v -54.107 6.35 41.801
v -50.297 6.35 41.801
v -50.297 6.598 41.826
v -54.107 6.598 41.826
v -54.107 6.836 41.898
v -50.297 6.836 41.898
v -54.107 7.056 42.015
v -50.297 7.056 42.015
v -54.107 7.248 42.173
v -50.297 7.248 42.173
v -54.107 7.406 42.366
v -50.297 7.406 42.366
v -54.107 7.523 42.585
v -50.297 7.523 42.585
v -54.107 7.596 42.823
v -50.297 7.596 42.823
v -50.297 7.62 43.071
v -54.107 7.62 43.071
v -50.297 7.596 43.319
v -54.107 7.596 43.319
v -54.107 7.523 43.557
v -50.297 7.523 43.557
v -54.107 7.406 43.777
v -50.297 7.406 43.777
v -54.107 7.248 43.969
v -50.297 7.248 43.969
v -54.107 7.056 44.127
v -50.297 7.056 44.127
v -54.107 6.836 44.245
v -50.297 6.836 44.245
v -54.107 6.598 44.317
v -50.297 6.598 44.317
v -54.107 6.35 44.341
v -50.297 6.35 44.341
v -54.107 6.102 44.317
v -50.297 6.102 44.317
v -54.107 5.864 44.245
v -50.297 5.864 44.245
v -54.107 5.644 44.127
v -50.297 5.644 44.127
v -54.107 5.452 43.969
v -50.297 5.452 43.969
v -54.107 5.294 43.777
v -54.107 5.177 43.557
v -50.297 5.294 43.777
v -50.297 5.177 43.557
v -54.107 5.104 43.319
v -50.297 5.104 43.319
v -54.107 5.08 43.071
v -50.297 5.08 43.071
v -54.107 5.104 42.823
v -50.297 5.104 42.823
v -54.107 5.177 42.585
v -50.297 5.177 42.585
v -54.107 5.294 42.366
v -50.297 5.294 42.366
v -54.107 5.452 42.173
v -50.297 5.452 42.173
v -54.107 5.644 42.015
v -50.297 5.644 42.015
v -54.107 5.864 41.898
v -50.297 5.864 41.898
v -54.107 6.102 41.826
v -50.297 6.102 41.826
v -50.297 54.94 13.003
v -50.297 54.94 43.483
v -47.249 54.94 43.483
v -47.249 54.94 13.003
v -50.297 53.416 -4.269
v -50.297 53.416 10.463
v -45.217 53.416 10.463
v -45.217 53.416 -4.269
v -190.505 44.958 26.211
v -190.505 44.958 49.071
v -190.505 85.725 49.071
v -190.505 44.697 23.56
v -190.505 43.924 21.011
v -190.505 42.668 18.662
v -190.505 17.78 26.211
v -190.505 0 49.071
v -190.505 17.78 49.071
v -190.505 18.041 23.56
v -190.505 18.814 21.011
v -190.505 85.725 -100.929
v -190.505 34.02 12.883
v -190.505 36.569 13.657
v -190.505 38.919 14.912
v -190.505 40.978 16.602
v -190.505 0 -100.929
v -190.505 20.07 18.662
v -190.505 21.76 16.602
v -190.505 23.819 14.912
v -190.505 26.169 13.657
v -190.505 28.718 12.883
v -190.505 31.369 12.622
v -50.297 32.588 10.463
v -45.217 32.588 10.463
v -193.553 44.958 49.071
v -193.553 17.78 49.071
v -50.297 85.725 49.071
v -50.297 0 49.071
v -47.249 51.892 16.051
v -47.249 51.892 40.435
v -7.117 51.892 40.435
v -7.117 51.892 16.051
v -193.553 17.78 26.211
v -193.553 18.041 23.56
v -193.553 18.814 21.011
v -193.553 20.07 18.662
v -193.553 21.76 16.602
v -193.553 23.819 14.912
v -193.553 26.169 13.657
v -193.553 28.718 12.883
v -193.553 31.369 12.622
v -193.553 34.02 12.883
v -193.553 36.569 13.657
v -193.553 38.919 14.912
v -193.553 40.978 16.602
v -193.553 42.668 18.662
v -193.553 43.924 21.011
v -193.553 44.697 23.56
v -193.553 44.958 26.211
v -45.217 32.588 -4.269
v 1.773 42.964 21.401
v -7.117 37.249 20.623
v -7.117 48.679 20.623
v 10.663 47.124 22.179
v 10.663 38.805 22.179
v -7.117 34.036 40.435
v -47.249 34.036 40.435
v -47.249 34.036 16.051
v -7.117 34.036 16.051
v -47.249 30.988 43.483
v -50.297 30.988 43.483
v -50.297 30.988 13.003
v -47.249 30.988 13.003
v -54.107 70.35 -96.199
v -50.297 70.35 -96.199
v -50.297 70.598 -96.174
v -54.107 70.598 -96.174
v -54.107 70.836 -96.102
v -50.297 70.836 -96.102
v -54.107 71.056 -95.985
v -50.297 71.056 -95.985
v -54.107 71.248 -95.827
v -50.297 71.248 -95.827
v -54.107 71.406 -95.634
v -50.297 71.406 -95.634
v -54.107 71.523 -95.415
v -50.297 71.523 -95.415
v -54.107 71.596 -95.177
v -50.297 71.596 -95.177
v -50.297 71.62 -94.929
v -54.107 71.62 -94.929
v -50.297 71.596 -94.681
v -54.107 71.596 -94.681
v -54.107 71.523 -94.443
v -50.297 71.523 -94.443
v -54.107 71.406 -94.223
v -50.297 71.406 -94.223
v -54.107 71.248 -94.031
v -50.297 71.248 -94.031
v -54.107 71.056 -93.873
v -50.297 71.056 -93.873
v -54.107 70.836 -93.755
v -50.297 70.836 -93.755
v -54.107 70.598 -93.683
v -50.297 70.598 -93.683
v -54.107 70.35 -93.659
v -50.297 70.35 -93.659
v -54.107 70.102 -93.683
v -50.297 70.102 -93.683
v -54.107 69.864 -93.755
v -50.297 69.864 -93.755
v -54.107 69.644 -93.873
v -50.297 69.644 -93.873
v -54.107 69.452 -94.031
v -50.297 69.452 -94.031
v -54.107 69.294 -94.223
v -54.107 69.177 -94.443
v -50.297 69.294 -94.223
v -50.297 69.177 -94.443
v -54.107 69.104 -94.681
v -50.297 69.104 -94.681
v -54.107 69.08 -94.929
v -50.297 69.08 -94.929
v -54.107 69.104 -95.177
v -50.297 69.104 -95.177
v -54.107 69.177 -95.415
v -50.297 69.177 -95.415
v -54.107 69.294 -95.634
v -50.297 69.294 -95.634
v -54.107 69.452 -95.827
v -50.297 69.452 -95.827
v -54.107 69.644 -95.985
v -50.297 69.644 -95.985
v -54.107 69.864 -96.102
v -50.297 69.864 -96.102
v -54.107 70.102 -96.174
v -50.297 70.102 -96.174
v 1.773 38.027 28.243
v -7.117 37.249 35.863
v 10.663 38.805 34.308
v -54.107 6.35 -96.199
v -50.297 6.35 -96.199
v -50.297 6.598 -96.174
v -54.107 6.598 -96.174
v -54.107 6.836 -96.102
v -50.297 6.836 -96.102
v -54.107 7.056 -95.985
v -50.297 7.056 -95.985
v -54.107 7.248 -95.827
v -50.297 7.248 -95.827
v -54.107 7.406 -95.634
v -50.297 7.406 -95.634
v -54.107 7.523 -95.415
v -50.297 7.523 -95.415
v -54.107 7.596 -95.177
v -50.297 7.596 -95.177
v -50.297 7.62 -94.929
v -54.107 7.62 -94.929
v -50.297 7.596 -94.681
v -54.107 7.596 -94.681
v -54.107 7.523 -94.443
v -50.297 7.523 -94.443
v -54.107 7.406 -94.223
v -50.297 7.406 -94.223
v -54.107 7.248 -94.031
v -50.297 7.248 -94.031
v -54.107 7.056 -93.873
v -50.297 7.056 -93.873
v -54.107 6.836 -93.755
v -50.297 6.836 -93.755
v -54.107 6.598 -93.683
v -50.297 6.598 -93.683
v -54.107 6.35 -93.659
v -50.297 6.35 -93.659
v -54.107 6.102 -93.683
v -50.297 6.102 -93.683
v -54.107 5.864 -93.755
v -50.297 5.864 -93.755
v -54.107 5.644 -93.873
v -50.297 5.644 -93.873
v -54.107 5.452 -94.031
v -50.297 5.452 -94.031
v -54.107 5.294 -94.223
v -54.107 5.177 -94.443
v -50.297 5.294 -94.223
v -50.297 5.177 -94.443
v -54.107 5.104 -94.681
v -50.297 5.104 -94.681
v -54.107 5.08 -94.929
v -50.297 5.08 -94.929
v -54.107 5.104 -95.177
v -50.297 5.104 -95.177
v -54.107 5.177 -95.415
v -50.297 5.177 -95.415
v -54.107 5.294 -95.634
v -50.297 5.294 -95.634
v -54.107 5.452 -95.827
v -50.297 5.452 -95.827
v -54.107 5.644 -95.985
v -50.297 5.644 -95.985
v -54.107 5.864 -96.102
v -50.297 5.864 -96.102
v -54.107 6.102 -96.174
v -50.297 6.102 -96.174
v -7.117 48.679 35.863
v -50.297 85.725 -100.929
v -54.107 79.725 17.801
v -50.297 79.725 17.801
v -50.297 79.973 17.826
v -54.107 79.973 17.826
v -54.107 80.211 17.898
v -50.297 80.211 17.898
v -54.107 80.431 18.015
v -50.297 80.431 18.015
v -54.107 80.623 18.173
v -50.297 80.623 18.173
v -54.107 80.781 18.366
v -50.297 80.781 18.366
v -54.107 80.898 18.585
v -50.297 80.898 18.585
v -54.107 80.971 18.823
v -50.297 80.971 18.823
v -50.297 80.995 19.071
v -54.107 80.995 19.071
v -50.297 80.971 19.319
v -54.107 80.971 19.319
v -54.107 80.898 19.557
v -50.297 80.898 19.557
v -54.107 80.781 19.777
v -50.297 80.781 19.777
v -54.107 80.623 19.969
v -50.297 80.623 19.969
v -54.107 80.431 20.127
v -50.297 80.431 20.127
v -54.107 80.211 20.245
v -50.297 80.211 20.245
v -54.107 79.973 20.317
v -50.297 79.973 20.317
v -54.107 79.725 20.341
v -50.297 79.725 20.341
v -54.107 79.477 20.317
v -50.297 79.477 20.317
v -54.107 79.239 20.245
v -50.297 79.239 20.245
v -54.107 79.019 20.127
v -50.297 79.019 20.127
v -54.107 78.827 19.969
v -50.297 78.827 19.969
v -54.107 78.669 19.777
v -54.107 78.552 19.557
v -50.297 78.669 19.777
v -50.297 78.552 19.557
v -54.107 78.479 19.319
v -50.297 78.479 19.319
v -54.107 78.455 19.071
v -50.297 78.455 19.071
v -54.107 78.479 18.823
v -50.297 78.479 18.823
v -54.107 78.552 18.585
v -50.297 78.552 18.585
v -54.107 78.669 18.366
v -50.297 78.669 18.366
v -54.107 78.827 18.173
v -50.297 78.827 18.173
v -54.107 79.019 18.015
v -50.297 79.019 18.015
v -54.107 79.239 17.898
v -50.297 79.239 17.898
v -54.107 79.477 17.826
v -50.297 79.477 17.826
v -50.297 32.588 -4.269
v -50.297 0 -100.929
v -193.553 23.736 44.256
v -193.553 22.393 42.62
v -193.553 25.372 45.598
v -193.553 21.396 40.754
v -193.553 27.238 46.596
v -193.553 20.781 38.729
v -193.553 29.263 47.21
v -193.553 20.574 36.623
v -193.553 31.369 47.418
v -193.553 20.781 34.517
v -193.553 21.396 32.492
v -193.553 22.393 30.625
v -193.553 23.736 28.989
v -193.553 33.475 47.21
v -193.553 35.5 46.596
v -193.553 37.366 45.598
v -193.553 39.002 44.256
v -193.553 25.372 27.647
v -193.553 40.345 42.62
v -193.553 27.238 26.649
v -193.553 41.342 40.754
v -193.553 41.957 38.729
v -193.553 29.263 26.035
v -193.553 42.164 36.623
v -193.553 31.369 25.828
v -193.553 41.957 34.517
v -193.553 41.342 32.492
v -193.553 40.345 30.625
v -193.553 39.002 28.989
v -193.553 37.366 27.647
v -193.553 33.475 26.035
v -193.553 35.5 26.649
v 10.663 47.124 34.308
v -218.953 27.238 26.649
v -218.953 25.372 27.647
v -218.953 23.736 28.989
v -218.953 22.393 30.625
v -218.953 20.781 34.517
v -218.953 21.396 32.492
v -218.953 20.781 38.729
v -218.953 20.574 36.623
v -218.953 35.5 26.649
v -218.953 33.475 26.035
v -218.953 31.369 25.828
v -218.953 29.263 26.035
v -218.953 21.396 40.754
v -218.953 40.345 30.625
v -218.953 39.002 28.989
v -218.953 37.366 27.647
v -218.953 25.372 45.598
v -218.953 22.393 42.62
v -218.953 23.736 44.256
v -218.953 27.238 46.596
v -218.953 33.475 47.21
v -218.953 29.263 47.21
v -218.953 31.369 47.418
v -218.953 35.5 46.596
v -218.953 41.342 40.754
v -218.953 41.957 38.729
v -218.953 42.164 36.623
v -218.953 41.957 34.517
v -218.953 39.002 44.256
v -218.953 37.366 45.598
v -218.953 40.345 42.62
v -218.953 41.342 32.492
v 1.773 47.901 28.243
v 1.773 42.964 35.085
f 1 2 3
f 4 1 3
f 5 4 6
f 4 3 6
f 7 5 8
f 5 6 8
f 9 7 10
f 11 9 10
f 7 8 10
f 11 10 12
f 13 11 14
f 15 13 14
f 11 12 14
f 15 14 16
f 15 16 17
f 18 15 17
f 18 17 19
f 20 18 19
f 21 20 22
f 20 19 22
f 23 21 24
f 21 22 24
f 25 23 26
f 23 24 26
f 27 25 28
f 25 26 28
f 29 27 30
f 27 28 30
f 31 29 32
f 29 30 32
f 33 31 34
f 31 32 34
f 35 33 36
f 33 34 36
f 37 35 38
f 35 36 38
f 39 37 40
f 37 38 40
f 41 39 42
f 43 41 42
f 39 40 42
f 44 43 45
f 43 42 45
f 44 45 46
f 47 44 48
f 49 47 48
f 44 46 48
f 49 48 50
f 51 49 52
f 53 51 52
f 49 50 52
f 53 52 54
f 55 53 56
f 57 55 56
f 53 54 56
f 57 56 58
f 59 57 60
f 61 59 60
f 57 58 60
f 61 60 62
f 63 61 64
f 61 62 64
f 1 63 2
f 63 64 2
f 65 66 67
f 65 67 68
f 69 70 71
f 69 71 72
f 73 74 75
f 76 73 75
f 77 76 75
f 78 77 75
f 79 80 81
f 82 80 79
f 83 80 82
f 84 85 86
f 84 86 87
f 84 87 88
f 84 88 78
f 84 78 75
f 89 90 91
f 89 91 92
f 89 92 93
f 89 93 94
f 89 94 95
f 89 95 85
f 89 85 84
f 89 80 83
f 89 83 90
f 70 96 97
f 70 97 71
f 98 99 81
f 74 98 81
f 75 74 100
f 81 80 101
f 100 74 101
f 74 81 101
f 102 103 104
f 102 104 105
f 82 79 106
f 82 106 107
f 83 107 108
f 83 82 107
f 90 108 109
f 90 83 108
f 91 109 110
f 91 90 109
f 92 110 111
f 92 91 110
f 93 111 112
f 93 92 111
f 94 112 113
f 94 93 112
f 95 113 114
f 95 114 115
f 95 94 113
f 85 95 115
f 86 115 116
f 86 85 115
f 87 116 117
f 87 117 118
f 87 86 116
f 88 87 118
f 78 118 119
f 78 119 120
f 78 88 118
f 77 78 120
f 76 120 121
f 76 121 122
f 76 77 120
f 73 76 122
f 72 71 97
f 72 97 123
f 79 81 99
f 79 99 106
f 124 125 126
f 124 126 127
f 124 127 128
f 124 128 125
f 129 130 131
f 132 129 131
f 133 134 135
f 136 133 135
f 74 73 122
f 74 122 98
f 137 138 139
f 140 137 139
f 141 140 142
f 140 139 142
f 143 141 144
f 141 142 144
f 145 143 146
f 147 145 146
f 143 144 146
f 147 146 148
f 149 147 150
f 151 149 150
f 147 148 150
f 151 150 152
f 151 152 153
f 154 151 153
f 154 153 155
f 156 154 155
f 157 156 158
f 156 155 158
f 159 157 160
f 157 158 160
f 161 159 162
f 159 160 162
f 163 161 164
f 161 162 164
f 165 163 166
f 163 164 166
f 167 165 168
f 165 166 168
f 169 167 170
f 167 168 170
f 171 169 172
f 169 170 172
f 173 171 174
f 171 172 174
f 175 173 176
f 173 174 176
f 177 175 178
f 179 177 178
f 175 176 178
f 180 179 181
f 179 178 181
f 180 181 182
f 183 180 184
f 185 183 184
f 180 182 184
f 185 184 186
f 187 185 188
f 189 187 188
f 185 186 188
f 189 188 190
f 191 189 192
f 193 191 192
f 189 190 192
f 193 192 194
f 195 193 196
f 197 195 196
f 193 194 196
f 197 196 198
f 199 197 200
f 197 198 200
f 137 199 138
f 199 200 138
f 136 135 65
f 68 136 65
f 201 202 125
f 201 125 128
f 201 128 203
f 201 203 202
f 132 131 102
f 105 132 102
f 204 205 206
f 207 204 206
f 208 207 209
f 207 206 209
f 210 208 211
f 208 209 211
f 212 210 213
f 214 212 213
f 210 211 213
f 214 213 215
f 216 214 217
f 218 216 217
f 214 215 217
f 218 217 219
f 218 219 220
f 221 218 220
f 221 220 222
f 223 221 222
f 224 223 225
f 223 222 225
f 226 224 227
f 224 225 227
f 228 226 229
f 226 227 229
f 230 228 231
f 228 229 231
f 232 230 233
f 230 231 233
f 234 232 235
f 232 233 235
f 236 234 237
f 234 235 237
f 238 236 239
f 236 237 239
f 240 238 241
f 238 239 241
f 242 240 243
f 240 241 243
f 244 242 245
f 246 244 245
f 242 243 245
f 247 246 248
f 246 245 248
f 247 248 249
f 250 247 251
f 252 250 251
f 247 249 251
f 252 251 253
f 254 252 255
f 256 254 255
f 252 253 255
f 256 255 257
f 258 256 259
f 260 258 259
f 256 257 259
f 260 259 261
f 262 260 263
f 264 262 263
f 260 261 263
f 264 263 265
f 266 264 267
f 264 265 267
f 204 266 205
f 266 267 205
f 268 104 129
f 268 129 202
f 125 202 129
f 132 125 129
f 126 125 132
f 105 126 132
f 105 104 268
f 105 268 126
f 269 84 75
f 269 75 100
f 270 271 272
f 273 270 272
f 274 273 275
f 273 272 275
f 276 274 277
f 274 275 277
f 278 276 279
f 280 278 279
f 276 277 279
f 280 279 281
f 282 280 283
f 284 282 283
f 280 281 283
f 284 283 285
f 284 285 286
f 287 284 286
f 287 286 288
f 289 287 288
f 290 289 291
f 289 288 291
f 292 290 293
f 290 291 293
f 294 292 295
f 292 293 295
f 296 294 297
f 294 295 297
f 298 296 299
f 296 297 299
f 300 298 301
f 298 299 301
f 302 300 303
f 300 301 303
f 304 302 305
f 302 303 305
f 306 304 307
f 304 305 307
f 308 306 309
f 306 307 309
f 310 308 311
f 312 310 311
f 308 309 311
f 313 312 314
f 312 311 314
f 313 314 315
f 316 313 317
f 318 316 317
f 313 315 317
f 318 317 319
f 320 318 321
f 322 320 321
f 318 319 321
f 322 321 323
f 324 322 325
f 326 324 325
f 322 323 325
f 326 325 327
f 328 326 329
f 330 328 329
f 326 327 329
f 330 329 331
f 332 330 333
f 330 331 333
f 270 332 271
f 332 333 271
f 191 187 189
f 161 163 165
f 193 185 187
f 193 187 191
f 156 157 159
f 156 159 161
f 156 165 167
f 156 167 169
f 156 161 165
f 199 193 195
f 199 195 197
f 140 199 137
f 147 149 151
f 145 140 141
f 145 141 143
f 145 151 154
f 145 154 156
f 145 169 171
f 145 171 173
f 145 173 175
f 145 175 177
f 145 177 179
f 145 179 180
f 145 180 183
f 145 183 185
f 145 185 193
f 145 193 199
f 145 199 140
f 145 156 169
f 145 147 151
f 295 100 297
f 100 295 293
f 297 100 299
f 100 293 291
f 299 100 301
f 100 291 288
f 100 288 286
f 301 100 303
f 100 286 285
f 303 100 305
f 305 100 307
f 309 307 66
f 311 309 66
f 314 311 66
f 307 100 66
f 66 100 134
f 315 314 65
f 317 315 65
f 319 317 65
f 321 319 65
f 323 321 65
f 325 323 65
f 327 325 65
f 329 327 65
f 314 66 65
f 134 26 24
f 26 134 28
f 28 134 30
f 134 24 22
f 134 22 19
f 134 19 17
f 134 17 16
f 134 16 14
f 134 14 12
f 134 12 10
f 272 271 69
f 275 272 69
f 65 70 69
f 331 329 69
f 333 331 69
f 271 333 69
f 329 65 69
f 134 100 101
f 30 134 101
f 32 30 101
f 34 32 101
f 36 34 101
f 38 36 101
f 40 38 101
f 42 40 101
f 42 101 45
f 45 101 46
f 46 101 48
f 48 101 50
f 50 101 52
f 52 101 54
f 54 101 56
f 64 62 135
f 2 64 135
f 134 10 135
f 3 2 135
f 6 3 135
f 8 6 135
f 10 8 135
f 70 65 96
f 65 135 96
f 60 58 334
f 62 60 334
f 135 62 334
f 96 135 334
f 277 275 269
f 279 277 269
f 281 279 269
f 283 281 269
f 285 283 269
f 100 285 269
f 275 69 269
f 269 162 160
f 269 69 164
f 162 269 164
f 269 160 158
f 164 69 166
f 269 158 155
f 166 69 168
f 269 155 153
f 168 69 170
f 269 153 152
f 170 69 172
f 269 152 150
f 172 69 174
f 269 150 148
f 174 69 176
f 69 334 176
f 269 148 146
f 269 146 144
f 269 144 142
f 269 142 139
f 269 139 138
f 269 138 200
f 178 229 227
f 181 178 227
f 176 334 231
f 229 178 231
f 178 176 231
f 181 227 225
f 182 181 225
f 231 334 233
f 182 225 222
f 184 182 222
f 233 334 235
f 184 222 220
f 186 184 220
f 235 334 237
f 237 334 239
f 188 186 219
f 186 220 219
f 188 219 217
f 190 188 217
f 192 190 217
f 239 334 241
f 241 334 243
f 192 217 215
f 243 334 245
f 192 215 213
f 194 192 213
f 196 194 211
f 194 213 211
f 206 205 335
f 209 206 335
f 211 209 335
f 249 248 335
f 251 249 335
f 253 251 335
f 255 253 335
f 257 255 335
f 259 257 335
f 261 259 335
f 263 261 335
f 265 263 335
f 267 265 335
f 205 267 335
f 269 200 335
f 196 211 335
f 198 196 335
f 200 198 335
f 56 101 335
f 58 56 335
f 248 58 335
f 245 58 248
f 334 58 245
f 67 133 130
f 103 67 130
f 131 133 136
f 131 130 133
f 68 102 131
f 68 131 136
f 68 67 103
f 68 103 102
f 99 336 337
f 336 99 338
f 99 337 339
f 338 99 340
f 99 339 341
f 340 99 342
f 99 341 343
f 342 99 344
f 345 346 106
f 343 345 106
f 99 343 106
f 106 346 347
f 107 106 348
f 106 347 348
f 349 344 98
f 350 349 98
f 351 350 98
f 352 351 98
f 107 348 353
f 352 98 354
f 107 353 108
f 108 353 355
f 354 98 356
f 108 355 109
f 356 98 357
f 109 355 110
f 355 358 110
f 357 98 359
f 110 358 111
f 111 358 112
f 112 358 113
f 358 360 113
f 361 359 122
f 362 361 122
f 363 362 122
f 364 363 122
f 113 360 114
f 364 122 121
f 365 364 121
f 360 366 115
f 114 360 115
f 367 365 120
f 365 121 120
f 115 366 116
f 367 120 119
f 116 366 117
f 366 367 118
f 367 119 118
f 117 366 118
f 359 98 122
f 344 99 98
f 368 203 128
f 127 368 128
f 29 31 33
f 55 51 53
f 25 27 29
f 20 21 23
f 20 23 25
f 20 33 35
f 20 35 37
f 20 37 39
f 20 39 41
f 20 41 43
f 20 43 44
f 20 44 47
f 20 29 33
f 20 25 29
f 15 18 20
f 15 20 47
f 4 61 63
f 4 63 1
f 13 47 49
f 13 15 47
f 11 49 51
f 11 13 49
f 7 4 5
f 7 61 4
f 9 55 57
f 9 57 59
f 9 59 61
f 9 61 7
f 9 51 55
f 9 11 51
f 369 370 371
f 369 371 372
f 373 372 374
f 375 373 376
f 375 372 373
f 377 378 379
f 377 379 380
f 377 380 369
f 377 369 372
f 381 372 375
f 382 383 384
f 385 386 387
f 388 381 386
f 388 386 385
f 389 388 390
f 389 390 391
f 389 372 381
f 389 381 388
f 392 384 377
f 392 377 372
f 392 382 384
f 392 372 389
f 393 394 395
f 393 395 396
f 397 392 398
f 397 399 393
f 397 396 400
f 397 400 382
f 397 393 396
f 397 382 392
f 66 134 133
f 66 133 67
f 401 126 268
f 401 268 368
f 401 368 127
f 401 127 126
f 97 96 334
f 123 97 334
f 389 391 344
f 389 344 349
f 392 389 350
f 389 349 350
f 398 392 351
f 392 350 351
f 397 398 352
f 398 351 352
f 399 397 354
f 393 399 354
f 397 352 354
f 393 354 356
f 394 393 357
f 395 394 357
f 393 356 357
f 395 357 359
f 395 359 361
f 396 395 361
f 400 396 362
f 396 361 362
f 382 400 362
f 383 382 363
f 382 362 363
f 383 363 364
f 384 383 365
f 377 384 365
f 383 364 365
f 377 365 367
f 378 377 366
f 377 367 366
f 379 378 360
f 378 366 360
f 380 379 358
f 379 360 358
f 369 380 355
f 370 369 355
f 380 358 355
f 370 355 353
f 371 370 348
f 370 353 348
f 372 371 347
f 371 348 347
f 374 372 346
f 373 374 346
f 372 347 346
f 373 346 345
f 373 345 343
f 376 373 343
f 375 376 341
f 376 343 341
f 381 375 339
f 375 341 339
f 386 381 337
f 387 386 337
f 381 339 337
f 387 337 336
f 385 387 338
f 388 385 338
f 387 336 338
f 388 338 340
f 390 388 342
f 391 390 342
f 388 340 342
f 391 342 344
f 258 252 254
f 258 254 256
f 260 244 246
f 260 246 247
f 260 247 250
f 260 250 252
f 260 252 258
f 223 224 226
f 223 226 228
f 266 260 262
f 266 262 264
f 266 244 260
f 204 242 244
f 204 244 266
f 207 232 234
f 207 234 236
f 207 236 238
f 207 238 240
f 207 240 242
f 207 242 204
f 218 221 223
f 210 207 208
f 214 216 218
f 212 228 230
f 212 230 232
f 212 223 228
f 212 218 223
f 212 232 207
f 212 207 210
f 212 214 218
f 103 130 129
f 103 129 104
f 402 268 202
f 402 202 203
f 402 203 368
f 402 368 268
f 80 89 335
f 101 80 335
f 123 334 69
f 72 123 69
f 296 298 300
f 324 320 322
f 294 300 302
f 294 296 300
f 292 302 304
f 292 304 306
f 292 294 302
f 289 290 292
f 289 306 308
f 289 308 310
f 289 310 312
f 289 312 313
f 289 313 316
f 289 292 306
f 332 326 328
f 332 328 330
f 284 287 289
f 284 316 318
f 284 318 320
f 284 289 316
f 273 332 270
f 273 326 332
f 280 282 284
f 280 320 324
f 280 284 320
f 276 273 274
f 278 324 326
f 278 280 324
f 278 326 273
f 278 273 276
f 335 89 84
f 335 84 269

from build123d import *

# Parameters (mm, degrees)
SKETCH1_W           = 140.208
SKETCH1_H           = 150
BOSS_EXTRUDE1_DEPTH = 85.725
SKETCH2_W           = 30.48
SKETCH2_H           = 23.9522
SKETCH2_W_2         = 24.384
SKETCH2_H_2         = 17.8562
BOSS_EXTRUDE2_DEPTH = 3.048
SKETCH3_W           = 14.732
SKETCH3_H           = 20.828
BOSS_EXTRUDE3_DEPTH = 5.08
SKETCH4_R           = 1.27
CUT_EXTRUDE1_DEPTH  = 3.81
BOSS_EXTRUDE4_DEPTH = 3.048
SKETCH6_R           = 10.795
BOSS_EXTRUDE5_DEPTH = 25.4
SKETCH7_W           = 24.384
SKETCH7_H           = 17.8562
BOSS_EXTRUDE6_DEPTH = 43.18
SKETCH8_W           = 15.24
SKETCH8_H           = 11.43
BOSS_EXTRUDE7_DEPTH = 17.78
BOSS_EXTRUDE7_TAPER = 5


with BuildPart() as part:
    # Sketch1 → Boss-Extrude1 (new body)
    with BuildSketch(Plane(origin=(0, 0, 0), x_dir=(1, 0, 0), z_dir=(0, 1, 0))):
        with Locations((-120.400582929, 25.928824242)):
            Rectangle(SKETCH1_W, SKETCH1_H)
    extrude(amount=BOSS_EXTRUDE1_DEPTH)

    # Sketch2 → Boss-Extrude2 (add)
    with BuildSketch(Plane(origin=(-50.296582929, 0, 0), x_dir=(0, 0, -1), z_dir=(1, 0, 0))):
        with Locations((-28.243175758, 42.9641)):
            Rectangle(SKETCH2_W, SKETCH2_H)
        with Locations((-28.243175758, 42.9641)):
            Rectangle(SKETCH2_W_2, SKETCH2_H_2, mode=Mode.SUBTRACT)
    extrude(amount=BOSS_EXTRUDE2_DEPTH)

    # Sketch3 → Boss-Extrude3 (add)
    with BuildSketch(Plane(origin=(-50.296582929, 0, 0), x_dir=(0, 0, -1), z_dir=(1, 0, 0))):
        with Locations((-3.097175758, 43.0022)):
            Rectangle(SKETCH3_W, SKETCH3_H)
    extrude(amount=BOSS_EXTRUDE3_DEPTH)

    # Sketch4 → Cut-Extrude1 (cut)
    with BuildSketch(Plane(origin=(-50.296582929, 0, 0), x_dir=(0, 0, -1), z_dir=(1, 0, 0))):
        with Locations((-43.071175758, 6.35)):
            Circle(SKETCH4_R)
        with Locations((94.928824242, 6.35)):
            Circle(SKETCH4_R)
        with Locations((94.928824242, 70.35)):
            Circle(SKETCH4_R)
        with Locations((-19.071175758, 79.725)):
            Circle(SKETCH4_R)
    extrude(amount=-CUT_EXTRUDE1_DEPTH, mode=Mode.SUBTRACT)

    # Sketch5 → Boss-Extrude4 (add)
    with BuildSketch(Plane.ZY.offset(190.504582929)):
        with BuildLine():
            Line((49.071175758, 17.78), (26.211175758, 17.78))
            ThreePointArc((26.211175758, 17.78), (12.622175758, 31.369), (26.211175758, 44.958))
            Line((26.211175758, 44.958), (49.071175758, 44.958))
            Line((49.071175758, 44.958), (49.071175758, 17.78))
        make_face()
    extrude(amount=BOSS_EXTRUDE4_DEPTH)

    # Sketch6 → Boss-Extrude5 (add)
    with BuildSketch(Plane.ZY.offset(193.552582929)):
        with Locations((36.622716845, 31.369)):
            Circle(SKETCH6_R)
    extrude(amount=BOSS_EXTRUDE5_DEPTH)

    # Sketch7 → Boss-Extrude6 (add)
    with BuildSketch(Plane(origin=(-50.296582929, 0, 0), x_dir=(0, 0, -1), z_dir=(1, 0, 0))):
        with Locations((-28.243175758, 42.9641)):
            Rectangle(SKETCH7_W, SKETCH7_H)
    extrude(amount=BOSS_EXTRUDE6_DEPTH)

    # Sketch8 → Boss-Extrude7 (add)
    with BuildSketch(Plane(origin=(-7.116582929, 0, 0), x_dir=(0, 0, -1), z_dir=(1, 0, 0))):
        with Locations((-28.243175758, 42.9641)):
            Rectangle(SKETCH8_W, SKETCH8_H)
    extrude(amount=BOSS_EXTRUDE7_DEPTH, taper=BOSS_EXTRUDE7_TAPER)


solid = part.part
